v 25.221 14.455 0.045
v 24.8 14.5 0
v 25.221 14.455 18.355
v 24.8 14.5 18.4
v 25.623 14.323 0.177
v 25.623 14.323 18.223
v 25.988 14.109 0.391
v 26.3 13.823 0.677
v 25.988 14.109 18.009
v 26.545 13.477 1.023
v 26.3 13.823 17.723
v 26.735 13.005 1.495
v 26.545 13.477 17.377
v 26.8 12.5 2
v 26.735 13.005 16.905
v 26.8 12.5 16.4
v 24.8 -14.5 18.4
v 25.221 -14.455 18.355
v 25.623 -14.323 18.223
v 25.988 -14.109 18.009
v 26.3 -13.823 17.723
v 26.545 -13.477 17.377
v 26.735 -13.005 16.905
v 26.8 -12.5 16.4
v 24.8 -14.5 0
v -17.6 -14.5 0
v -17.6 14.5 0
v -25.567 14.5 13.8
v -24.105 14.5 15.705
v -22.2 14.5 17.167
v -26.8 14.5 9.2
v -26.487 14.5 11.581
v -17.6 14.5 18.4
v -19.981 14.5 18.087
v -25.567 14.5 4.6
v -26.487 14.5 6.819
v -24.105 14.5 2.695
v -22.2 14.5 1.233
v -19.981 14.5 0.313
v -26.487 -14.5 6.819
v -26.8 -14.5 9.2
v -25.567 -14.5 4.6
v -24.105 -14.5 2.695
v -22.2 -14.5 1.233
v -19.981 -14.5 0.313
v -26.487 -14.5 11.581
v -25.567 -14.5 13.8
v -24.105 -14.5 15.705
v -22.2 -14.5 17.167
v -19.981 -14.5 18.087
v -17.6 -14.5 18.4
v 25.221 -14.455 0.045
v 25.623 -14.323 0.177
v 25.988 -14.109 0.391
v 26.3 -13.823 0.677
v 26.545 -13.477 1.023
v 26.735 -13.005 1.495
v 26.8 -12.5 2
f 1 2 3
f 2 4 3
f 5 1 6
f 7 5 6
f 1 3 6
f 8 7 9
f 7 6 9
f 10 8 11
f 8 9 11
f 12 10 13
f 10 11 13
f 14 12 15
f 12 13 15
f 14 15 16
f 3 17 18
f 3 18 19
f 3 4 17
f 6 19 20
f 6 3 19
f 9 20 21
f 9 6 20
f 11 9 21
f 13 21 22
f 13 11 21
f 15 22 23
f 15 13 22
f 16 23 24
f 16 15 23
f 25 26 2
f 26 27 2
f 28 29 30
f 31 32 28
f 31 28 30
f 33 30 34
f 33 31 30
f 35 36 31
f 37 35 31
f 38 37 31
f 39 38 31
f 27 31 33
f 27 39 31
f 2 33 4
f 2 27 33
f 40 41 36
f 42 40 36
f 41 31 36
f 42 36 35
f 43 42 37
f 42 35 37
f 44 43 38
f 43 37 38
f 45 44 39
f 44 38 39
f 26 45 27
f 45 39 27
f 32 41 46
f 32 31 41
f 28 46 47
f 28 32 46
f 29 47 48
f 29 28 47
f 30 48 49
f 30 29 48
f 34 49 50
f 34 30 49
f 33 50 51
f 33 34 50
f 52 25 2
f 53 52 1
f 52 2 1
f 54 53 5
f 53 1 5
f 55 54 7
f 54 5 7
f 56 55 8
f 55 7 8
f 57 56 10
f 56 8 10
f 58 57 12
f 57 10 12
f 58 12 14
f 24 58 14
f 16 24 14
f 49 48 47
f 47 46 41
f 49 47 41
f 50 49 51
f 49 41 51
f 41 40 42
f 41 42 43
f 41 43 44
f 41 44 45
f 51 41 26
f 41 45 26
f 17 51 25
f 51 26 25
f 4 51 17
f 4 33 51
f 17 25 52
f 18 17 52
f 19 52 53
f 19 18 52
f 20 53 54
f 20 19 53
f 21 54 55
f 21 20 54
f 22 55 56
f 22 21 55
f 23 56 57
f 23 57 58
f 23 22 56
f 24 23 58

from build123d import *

# Parameters (mm, degrees)
F0_W     = 53.6
F0_H     = 29
F1_DEPTH = 18.4
F2_R     = 9.19999
F3_R     = 2


# Not quite as in the source:
# - a fillet or chamfer is up to 0.001 mm smaller than in the source, because OpenCascade refuses the exact size


with BuildPart() as f1:
    # F0 (on Top) → F1 (new body)
    with BuildSketch(Plane.XY):
        Rectangle(F0_W, F0_H)
    extrude(amount=F1_DEPTH)

    # F2 (radius 9.2 in the source; OpenCascade refuses exactly that, so slightly less here)
    f2_edges = [f1.edges().sort_by_distance(p)[0] for p in [
        (-26.8, 0, 18.4),
        (-26.8, 0, 0),
    ]]
    fillet(f2_edges, radius=F2_R)

    # F3
    f3_edges = [f1.edges().sort_by_distance(p)[0] for p in [
        (26.8, -14.5, 9.2),
        (26.8, 14.5, 9.2),
        (26.8, 0, 0),
        (26.8, 0, 18.4),
    ]]
    fillet(f3_edges, radius=F3_R)


solid = f1.part
